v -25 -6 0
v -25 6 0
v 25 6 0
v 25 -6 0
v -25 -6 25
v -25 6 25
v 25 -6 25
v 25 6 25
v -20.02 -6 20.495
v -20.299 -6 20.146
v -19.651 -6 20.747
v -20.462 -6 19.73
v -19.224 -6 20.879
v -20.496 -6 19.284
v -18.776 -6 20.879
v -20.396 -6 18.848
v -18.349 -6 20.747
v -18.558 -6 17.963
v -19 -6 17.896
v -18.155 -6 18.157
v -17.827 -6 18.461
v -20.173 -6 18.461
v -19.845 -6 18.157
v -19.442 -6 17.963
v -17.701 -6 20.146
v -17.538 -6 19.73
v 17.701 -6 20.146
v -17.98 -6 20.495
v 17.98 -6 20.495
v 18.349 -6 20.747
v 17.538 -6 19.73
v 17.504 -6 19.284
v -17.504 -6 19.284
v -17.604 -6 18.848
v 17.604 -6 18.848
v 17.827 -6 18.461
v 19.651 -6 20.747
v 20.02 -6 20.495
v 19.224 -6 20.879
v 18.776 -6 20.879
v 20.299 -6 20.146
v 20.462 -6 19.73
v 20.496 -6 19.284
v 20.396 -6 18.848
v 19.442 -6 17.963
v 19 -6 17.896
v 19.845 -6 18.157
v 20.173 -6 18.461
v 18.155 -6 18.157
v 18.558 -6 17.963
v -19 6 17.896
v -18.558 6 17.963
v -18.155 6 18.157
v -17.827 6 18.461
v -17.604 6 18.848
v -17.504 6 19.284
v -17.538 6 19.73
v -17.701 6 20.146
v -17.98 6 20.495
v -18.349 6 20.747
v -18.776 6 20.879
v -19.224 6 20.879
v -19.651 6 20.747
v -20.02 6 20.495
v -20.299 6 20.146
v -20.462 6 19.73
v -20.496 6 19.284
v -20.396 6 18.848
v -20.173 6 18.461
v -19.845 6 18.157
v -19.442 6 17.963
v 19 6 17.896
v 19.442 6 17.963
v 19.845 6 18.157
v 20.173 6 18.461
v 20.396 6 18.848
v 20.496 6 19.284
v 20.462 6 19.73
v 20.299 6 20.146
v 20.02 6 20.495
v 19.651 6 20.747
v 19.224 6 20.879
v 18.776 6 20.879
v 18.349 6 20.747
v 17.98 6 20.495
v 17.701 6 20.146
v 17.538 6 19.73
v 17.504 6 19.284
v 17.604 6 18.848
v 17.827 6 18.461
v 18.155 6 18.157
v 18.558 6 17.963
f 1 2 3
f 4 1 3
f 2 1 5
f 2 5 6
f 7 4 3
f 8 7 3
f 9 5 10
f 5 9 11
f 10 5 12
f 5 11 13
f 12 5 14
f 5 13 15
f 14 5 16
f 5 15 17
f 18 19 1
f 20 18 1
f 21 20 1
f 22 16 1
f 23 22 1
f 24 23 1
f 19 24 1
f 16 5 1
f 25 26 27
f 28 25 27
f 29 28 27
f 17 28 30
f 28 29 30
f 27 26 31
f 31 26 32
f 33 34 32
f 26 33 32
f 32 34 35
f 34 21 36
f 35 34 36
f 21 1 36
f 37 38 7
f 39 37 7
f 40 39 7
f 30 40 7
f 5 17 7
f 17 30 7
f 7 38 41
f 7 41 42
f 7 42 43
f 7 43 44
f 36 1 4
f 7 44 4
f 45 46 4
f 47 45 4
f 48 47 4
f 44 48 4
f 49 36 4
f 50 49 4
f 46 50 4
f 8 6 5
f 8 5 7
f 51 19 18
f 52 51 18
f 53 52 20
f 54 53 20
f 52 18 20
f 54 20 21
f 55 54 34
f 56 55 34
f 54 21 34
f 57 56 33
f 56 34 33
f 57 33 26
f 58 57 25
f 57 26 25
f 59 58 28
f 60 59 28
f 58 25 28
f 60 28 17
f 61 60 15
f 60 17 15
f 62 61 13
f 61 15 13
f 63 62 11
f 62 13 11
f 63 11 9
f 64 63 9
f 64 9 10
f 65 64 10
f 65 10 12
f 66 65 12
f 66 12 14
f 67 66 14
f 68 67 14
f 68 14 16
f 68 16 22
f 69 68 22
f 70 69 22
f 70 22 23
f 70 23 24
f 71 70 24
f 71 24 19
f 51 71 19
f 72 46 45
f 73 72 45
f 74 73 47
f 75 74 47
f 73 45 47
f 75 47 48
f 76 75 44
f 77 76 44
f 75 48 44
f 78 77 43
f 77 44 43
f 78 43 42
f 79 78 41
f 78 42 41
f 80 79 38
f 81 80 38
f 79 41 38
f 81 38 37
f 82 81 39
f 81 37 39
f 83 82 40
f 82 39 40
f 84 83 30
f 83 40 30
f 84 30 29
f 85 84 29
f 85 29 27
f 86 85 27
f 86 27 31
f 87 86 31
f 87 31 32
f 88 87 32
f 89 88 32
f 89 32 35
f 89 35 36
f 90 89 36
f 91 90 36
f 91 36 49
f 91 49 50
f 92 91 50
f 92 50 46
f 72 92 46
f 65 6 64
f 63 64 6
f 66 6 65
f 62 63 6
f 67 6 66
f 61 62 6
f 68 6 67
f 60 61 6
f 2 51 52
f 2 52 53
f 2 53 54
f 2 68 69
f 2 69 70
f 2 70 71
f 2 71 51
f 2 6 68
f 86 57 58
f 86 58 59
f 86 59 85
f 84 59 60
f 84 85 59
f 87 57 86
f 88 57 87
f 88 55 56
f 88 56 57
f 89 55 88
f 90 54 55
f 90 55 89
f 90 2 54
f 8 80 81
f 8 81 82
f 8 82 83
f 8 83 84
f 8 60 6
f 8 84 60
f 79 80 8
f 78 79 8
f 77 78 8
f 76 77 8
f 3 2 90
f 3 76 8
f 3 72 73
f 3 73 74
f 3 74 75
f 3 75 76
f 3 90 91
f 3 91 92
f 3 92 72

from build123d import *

# Parameters (mm, degrees)
SKETCH1_W           = 50
SKETCH1_H           = 12
BOSS_EXTRUDE1_DEPTH = 25
CUT_EXTRUDE1_REACH  = 39.336
SKETCH2_R           = 1.5


with BuildPart() as part:
    # Sketch1 → Boss-Extrude1 (new body)
    with BuildSketch(Plane.XY):
        Rectangle(SKETCH1_W, SKETCH1_H)
    extrude(amount=BOSS_EXTRUDE1_DEPTH)

    # Sketch2 → Cut-Extrude1 (cut, up to next)
    with BuildSketch(Plane.XZ.offset(6), mode=Mode.PRIVATE) as cut_extrude1_sk1:
        with Locations(Location((-19, 19.395863619, 0), (0, 0, 270))):
            Circle(SKETCH2_R)
    cut_extrude1_tool1 = extrude(cut_extrude1_sk1.sketch, amount=-CUT_EXTRUDE1_REACH, mode=Mode.PRIVATE) & part.part
    # Sketch2 → Cut-Extrude1 (cut, up to next)
    with BuildSketch(Plane.XZ.offset(6), mode=Mode.PRIVATE) as cut_extrude1_sk2:
        with Locations(Location((19, 19.395863619, 0), (0, 0, 270))):
            Circle(SKETCH2_R)
    cut_extrude1_tool2 = extrude(cut_extrude1_sk2.sketch, amount=-CUT_EXTRUDE1_REACH, mode=Mode.PRIVATE) & part.part
    add(cut_extrude1_tool1.solids().sort_by_distance((-19, -6, 19.395864))[0], mode=Mode.SUBTRACT)
    add(cut_extrude1_tool2.solids().sort_by_distance((19, -6, 19.395864))[0], mode=Mode.SUBTRACT)


solid = part.part
